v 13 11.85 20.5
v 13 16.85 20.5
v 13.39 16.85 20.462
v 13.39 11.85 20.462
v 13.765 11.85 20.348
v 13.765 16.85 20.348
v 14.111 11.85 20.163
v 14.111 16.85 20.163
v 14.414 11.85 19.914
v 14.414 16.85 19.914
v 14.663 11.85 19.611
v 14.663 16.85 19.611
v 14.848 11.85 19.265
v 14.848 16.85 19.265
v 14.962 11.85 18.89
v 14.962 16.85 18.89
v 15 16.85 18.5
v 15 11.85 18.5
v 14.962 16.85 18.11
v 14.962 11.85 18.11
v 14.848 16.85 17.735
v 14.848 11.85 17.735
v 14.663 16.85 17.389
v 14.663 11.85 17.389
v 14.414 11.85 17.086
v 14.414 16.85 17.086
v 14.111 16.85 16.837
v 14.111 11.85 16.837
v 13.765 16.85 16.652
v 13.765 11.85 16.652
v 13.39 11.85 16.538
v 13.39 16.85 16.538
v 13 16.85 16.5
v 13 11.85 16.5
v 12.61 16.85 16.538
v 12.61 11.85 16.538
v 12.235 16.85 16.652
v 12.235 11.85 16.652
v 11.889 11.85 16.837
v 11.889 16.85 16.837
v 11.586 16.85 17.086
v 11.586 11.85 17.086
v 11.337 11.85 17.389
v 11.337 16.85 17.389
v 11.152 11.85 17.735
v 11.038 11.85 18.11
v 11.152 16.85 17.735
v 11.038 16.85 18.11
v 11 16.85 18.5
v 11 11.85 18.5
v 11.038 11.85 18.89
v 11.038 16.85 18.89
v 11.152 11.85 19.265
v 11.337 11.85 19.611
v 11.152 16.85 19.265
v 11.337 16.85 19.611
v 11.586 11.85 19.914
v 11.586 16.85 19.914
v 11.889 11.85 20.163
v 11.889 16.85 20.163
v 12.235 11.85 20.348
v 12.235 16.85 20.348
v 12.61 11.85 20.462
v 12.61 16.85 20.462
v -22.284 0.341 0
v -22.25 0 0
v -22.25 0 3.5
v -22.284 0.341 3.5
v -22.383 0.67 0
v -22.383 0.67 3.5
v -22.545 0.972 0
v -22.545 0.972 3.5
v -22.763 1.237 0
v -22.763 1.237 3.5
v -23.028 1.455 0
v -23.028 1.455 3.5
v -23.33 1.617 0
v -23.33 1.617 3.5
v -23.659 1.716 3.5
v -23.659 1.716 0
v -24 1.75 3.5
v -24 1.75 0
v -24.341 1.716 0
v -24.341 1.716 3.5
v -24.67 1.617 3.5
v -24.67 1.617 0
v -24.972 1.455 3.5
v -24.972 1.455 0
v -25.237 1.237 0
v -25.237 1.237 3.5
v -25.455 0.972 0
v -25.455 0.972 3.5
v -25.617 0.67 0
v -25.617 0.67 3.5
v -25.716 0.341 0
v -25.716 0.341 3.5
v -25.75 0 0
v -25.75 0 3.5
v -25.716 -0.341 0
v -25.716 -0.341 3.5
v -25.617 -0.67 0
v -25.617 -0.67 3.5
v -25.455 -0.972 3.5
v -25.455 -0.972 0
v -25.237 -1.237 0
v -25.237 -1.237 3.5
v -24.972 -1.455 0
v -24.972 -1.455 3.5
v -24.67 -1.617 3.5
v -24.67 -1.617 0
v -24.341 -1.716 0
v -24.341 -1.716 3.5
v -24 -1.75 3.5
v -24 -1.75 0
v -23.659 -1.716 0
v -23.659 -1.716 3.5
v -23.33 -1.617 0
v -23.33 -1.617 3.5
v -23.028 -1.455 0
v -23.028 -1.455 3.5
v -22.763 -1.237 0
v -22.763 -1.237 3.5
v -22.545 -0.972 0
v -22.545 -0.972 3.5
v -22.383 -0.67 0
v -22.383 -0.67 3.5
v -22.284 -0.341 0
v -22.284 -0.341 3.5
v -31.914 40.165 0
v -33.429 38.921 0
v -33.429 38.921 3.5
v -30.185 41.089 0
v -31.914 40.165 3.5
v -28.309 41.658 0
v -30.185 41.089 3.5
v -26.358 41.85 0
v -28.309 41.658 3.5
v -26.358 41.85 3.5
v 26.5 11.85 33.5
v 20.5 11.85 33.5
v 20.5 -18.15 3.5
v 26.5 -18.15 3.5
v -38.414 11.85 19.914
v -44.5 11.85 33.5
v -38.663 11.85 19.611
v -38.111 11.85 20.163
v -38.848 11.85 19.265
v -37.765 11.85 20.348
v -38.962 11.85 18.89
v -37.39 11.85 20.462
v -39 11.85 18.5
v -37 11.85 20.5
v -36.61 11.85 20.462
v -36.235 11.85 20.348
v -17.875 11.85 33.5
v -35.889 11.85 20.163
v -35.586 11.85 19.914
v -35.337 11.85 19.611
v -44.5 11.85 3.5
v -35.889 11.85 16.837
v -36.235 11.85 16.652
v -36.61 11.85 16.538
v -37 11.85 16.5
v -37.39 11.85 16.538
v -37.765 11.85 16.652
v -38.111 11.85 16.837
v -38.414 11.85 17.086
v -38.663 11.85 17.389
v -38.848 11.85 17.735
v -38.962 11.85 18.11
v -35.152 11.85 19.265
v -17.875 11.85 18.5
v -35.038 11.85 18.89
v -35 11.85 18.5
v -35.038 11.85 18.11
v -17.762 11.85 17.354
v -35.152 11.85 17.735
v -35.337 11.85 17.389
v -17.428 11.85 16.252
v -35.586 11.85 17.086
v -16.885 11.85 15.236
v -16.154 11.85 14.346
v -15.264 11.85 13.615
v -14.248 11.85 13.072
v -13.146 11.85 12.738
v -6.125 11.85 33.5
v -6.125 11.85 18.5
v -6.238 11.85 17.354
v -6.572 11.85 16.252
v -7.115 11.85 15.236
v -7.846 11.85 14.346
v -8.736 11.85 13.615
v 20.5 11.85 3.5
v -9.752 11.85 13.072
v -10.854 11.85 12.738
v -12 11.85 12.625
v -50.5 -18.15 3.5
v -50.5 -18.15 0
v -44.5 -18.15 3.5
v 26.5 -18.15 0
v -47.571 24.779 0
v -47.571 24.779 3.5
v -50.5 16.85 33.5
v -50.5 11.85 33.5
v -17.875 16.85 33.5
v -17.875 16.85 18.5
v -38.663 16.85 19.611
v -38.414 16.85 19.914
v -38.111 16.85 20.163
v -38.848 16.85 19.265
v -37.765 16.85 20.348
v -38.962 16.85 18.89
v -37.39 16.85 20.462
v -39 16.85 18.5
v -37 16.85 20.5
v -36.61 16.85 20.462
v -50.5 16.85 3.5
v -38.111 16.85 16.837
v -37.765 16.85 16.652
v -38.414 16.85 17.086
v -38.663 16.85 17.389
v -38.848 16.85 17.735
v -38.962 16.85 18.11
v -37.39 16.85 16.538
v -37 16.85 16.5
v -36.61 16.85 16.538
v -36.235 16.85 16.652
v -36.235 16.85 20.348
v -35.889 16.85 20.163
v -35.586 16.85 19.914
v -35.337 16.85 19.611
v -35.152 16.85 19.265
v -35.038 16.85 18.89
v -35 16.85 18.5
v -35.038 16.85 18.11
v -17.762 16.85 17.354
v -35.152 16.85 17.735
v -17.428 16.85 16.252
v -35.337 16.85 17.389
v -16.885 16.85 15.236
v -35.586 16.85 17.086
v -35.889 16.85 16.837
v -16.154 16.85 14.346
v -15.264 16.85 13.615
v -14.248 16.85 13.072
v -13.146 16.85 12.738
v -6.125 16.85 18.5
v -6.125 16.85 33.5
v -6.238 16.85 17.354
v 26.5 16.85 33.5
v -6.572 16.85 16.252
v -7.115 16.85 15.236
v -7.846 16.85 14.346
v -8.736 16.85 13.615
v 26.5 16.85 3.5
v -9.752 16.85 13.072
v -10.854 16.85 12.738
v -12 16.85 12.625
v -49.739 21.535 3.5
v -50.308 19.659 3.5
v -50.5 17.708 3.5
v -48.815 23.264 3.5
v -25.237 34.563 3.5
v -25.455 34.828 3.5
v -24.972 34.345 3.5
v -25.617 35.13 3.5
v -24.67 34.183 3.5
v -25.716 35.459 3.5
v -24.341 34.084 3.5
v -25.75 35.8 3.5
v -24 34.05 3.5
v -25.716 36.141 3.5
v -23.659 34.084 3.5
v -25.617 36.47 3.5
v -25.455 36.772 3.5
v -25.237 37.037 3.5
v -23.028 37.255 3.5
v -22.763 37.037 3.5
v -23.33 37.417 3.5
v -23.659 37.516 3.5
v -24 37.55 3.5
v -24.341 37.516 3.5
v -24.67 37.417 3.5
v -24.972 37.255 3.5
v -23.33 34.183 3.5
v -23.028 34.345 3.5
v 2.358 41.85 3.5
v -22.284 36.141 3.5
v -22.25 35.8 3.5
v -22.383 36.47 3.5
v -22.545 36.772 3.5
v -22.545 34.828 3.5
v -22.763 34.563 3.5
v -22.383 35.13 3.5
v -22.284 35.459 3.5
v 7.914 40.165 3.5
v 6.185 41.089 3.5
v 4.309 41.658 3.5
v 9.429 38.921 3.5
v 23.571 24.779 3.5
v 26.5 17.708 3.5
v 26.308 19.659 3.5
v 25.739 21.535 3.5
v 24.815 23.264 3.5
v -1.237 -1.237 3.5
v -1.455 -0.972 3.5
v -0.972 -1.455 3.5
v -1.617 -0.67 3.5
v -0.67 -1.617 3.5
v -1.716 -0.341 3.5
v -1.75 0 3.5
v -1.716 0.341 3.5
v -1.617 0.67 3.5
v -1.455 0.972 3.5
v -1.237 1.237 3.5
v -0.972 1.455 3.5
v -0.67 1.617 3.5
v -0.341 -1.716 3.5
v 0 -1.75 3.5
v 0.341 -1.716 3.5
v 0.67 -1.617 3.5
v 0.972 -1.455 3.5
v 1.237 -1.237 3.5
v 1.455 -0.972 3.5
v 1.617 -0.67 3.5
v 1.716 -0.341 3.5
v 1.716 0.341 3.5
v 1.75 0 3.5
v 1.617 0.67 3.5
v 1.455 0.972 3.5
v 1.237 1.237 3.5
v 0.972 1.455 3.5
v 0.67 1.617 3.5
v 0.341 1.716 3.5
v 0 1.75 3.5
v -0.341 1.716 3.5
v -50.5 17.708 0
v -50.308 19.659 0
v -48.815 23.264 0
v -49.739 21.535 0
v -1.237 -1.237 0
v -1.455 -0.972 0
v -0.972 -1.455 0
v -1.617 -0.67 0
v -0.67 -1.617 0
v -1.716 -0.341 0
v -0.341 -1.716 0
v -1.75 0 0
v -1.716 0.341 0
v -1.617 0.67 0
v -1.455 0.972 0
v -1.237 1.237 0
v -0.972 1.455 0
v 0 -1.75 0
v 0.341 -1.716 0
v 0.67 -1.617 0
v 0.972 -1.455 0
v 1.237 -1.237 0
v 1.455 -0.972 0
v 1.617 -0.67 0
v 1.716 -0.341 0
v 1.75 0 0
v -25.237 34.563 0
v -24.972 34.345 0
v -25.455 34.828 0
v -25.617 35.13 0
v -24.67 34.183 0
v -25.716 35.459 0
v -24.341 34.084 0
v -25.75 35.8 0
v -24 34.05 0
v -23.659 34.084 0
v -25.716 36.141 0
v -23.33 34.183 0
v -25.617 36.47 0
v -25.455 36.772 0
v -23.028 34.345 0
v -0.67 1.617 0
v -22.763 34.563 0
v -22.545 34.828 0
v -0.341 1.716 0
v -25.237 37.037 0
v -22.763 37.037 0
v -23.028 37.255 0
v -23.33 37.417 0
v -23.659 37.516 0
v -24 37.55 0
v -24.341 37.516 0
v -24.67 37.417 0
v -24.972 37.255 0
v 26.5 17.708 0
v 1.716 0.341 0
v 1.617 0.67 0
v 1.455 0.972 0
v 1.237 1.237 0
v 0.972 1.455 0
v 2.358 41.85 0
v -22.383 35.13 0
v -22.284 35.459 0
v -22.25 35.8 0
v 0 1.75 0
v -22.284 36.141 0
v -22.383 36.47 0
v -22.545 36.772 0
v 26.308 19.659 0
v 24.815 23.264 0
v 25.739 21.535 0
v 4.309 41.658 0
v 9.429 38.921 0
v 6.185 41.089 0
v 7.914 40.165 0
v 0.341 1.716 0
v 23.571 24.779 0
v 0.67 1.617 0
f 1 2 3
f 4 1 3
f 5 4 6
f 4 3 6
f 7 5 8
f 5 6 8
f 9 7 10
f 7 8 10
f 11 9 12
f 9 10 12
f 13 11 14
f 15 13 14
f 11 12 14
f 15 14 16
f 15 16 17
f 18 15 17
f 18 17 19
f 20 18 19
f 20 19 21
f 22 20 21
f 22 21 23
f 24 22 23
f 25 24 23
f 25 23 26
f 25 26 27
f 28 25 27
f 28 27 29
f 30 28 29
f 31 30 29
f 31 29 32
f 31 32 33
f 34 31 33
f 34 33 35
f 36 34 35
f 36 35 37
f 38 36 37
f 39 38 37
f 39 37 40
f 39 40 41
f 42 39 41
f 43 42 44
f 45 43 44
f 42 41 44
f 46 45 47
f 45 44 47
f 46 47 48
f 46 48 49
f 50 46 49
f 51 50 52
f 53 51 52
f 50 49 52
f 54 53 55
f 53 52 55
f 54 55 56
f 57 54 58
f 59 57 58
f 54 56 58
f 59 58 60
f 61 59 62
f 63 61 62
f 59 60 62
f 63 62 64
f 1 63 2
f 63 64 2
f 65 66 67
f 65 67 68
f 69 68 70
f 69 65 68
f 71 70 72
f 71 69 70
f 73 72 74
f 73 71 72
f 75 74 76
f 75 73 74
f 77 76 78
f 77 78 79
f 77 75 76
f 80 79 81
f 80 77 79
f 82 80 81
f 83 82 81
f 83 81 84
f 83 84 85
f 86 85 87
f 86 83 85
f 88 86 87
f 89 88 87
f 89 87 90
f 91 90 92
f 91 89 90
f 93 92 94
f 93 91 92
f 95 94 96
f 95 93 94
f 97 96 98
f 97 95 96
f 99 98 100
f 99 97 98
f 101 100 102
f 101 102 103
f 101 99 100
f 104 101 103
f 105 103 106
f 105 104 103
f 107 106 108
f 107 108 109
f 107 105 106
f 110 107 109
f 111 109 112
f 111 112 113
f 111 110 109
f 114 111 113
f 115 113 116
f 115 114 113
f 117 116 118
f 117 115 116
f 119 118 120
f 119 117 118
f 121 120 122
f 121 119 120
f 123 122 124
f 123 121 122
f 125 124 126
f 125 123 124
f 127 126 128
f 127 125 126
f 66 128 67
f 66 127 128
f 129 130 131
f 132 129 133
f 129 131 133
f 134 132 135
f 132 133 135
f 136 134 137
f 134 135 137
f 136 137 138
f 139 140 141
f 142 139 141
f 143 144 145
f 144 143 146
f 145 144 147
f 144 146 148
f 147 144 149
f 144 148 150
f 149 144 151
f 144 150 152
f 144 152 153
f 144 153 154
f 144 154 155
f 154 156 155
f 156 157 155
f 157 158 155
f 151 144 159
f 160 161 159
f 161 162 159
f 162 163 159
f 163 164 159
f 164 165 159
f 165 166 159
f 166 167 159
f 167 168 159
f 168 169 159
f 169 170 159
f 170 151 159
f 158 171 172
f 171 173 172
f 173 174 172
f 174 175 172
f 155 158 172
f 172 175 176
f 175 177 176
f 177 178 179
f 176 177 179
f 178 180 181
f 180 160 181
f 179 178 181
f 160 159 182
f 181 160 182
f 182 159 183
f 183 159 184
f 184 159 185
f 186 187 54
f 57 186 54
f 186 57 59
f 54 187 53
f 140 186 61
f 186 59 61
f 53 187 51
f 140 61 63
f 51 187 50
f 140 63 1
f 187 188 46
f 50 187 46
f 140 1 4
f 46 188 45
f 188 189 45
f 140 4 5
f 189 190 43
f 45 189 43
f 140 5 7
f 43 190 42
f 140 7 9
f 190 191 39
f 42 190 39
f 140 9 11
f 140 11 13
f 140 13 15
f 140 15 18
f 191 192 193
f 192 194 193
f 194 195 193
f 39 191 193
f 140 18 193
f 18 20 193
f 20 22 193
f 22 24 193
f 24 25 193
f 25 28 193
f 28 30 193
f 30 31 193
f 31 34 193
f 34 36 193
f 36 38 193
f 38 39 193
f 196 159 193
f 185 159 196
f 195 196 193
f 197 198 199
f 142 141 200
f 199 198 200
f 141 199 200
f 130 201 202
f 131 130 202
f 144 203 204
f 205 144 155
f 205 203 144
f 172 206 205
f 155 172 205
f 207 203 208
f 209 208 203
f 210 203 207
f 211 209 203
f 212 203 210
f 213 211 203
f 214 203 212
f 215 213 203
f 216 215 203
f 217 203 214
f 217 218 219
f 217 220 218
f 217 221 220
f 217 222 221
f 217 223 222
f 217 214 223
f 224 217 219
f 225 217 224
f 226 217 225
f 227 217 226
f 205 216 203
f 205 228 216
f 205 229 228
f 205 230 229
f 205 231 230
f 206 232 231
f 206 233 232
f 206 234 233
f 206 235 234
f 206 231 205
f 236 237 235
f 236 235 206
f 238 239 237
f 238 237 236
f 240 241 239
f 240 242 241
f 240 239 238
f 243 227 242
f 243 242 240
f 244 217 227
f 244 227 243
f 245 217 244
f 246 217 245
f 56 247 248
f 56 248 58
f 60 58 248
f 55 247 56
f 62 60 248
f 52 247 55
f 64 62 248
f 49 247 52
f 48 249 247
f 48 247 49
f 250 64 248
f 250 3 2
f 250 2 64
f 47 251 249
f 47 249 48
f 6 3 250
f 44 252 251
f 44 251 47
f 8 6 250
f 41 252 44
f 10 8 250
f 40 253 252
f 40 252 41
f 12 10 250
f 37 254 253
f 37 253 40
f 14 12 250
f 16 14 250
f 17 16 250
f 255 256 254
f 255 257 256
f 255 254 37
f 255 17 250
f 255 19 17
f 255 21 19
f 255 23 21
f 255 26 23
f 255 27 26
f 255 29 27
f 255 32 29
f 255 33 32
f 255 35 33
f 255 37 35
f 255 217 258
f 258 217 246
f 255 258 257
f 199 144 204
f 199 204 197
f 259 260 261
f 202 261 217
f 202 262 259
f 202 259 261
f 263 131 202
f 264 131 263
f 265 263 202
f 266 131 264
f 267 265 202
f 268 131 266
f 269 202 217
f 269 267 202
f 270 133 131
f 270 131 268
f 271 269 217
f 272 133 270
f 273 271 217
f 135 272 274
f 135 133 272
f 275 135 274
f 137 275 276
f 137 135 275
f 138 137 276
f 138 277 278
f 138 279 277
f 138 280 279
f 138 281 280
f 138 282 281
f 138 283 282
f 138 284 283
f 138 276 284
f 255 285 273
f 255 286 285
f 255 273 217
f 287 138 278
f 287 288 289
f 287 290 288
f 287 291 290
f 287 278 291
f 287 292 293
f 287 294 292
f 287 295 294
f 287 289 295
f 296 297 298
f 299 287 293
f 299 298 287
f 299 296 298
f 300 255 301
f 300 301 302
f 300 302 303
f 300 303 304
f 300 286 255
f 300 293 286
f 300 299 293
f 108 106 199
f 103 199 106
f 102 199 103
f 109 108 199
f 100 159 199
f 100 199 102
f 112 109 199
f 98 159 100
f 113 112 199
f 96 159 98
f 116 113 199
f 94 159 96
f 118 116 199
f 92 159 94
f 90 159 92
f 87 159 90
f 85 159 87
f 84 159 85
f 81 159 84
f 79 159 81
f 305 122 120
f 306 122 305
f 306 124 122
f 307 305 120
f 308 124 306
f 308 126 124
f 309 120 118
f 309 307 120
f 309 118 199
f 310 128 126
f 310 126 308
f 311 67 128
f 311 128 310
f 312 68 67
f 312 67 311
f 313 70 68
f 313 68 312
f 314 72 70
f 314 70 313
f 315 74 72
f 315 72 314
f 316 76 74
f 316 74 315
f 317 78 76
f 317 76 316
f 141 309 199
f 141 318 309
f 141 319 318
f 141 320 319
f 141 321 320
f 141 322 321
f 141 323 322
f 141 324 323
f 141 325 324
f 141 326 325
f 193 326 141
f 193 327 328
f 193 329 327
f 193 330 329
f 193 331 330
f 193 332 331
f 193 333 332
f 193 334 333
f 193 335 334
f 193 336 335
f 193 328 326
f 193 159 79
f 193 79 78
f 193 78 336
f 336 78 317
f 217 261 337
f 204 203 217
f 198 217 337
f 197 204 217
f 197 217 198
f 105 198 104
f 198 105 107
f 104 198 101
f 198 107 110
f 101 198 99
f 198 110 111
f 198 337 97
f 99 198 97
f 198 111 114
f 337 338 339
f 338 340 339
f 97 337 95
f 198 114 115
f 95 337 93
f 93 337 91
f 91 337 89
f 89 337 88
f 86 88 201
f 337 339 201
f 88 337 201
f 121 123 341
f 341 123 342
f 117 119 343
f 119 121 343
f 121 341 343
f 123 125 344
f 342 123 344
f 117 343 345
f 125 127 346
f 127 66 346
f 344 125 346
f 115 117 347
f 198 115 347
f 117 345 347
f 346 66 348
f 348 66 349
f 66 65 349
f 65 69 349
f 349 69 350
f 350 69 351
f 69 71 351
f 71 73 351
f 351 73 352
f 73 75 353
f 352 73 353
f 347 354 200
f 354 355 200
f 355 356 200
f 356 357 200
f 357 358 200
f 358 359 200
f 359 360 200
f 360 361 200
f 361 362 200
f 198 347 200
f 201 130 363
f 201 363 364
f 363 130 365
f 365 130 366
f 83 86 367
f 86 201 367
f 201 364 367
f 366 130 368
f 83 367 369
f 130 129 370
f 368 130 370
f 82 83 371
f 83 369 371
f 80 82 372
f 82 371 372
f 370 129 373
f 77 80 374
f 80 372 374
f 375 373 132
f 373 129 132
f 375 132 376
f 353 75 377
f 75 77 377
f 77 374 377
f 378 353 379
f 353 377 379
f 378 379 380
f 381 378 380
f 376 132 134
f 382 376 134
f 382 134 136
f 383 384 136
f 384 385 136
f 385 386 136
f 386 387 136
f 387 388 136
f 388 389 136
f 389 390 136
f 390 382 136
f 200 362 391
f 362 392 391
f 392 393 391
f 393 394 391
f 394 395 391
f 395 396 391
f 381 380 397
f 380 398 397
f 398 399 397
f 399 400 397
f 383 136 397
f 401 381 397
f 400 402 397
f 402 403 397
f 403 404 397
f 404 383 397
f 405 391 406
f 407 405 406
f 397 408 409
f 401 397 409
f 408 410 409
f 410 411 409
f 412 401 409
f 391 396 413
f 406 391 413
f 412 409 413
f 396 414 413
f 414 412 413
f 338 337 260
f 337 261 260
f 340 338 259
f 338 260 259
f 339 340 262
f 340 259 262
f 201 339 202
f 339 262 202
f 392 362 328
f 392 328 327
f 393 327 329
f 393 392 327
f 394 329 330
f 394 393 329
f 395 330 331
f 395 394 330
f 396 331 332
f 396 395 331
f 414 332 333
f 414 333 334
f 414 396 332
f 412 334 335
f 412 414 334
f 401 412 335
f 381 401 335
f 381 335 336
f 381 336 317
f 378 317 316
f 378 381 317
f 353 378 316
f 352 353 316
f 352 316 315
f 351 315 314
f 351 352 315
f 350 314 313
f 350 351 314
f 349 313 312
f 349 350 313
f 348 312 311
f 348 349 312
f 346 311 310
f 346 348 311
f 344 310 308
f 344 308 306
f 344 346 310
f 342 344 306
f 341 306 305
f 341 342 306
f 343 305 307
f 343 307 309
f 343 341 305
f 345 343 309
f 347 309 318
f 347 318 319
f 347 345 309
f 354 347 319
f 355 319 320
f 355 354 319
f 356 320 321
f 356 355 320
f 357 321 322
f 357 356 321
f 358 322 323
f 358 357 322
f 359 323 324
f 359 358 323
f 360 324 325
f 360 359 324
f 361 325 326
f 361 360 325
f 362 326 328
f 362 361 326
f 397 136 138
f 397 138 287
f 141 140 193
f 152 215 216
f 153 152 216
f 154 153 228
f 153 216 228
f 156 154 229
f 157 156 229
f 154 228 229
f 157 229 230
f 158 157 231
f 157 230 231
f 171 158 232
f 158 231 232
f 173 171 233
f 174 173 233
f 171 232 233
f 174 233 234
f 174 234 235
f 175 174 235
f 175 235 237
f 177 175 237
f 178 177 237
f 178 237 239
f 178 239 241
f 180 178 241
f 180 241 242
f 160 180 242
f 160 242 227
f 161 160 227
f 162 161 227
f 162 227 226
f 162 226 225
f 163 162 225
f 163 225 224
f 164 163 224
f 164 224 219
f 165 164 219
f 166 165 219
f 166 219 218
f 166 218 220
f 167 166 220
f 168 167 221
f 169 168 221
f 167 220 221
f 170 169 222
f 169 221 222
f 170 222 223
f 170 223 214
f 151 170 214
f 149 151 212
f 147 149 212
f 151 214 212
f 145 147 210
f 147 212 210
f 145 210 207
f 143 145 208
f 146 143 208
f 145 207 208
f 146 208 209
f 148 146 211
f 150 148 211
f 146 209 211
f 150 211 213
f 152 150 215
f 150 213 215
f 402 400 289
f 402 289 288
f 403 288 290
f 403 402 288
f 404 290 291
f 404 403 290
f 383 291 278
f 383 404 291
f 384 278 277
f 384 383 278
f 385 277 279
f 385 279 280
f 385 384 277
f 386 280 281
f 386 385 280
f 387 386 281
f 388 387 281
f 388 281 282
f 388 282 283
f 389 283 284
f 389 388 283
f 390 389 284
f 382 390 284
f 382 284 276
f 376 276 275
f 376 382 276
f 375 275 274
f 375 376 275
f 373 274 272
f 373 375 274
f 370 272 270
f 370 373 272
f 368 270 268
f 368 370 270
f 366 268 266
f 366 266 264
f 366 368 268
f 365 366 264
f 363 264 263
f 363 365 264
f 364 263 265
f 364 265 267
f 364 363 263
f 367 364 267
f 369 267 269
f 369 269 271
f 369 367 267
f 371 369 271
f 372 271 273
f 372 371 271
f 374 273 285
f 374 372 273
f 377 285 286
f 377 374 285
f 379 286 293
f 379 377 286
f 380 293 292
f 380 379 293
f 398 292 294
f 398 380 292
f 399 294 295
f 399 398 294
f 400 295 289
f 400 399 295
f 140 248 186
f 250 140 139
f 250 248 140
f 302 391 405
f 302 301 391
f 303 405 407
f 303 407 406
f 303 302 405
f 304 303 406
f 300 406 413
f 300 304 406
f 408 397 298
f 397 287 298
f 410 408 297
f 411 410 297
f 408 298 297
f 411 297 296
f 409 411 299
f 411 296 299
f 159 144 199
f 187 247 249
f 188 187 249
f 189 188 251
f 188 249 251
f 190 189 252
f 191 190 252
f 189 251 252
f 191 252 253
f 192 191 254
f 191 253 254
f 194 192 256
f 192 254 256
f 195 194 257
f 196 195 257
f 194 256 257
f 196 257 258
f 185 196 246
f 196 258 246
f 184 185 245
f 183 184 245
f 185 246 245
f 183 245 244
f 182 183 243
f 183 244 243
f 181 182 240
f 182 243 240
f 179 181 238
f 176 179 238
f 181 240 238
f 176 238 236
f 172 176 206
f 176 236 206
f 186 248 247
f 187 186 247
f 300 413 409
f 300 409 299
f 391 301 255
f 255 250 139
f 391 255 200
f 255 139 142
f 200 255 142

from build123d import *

# Parameters (mm, degrees)
SKETCH1_W           = 77
SKETCH1_H           = 60
SKETCH1_R           = 1.75
BOSS_EXTRUDE1_DEPTH = 3.5
SKETCH2_W           = 77
SKETCH2_H           = 5
BOSS_EXTRUDE2_DEPTH = 30
CUT_EXTRUDE1_DEPTH  = 20
SKETCH4_R           = 2
CUT_EXTRUDE2_DEPTH  = 20
RIB2_REACH          = 95.823
SKETCH5_WALL_W      = 232.071524048
SKETCH5_WALL_H      = 6
CHAMFER1_SIZE       = 20
FILLET1_R           = 10


with BuildPart() as part:
    # Sketch1 → Boss-Extrude1 (new body)
    with BuildSketch(Plane.XY):
        with Locations((-12, 11.85)):
            Rectangle(SKETCH1_W, SKETCH1_H)
        with Locations((-24, 35.8)):
            Circle(SKETCH1_R, mode=Mode.SUBTRACT)
        with Locations((-24, 0)):
            Circle(SKETCH1_R, mode=Mode.SUBTRACT)
        Circle(SKETCH1_R, mode=Mode.SUBTRACT)
    extrude(amount=BOSS_EXTRUDE1_DEPTH)

    # Sketch2 → Boss-Extrude2 (add)
    with BuildSketch(Plane.XY.offset(3.5)):
        with Locations((-12, 14.35)):
            Rectangle(SKETCH2_W, SKETCH2_H)
    extrude(amount=BOSS_EXTRUDE2_DEPTH)

    # Sketch3 → Cut-Extrude1 (cut)
    with BuildSketch(Plane(origin=(0, 16.85, 0), x_dir=(1, 0, 0), z_dir=(0, 1, 0))):
        with BuildLine():
            Line((-17.875, -18.5), (-17.875, -33.5))
            Line((-17.875, -33.5), (-6.125, -33.5))
            Line((-6.125, -33.5), (-6.125, -18.5))
            ThreePointArc((-6.125, -18.5), (-12, -12.625), (-17.875, -18.5))
        make_face()
    extrude(amount=-CUT_EXTRUDE1_DEPTH, mode=Mode.SUBTRACT)

    # Sketch4 → Cut-Extrude2 (cut)
    with BuildSketch(Plane(origin=(0, 16.85, 0), x_dir=(1, 0, 0), z_dir=(0, 1, 0))):
        with Locations(Location((13, -18.5, 0), (0, 0, 270))):
            Circle(SKETCH4_R)
        with Locations(Location((-37, -18.5, 0), (0, 0, 270))):
            Circle(SKETCH4_R)
    extrude(amount=-CUT_EXTRUDE2_DEPTH, mode=Mode.SUBTRACT)

    # Sketch5 wall → Rib2 (add, up to next)
    with BuildSketch(Plane(origin=(26.5, -3.15, 18.5), x_dir=(0, -0.707106781187, -0.707106781187), z_dir=(0, 0.707106781187, -0.707106781187)), mode=Mode.PRIVATE) as rib2_sk1:
        with Locations((0, 3)):
            Rectangle(SKETCH5_WALL_W, SKETCH5_WALL_H)
    rib2_tool1 = extrude(rib2_sk1.sketch, amount=RIB2_REACH, mode=Mode.PRIVATE) - part.part
    rib2 = rib2_tool1.solids().sort_by_distance((26.5, -3.15, 18.5))[0]
    add(rib2)

    # Mirror1: Rib2 across plane
    add(rib2.mirror(Plane(origin=(-12, 0, 0), x_dir=(0, 0, 1), z_dir=(1, 0, 0))))

    # Chamfer1
    chamfer1_edges = [part.edges().sort_by_distance(p)[0] for p in [
        (-50.5, 41.85, 1.75),
        (26.5, 41.85, 1.75),
    ]]
    chamfer(chamfer1_edges, length=CHAMFER1_SIZE)

    # Fillet1
    fillet1_edges = [part.edges().sort_by_distance(p)[0] for p in [
        (-50.5, 21.85, 1.75),
        (-30.5, 41.85, 1.75),
        (26.5, 21.85, 1.75),
        (6.5, 41.85, 1.75),
    ]]
    fillet(fillet1_edges, radius=FILLET1_R)


solid = part.part
